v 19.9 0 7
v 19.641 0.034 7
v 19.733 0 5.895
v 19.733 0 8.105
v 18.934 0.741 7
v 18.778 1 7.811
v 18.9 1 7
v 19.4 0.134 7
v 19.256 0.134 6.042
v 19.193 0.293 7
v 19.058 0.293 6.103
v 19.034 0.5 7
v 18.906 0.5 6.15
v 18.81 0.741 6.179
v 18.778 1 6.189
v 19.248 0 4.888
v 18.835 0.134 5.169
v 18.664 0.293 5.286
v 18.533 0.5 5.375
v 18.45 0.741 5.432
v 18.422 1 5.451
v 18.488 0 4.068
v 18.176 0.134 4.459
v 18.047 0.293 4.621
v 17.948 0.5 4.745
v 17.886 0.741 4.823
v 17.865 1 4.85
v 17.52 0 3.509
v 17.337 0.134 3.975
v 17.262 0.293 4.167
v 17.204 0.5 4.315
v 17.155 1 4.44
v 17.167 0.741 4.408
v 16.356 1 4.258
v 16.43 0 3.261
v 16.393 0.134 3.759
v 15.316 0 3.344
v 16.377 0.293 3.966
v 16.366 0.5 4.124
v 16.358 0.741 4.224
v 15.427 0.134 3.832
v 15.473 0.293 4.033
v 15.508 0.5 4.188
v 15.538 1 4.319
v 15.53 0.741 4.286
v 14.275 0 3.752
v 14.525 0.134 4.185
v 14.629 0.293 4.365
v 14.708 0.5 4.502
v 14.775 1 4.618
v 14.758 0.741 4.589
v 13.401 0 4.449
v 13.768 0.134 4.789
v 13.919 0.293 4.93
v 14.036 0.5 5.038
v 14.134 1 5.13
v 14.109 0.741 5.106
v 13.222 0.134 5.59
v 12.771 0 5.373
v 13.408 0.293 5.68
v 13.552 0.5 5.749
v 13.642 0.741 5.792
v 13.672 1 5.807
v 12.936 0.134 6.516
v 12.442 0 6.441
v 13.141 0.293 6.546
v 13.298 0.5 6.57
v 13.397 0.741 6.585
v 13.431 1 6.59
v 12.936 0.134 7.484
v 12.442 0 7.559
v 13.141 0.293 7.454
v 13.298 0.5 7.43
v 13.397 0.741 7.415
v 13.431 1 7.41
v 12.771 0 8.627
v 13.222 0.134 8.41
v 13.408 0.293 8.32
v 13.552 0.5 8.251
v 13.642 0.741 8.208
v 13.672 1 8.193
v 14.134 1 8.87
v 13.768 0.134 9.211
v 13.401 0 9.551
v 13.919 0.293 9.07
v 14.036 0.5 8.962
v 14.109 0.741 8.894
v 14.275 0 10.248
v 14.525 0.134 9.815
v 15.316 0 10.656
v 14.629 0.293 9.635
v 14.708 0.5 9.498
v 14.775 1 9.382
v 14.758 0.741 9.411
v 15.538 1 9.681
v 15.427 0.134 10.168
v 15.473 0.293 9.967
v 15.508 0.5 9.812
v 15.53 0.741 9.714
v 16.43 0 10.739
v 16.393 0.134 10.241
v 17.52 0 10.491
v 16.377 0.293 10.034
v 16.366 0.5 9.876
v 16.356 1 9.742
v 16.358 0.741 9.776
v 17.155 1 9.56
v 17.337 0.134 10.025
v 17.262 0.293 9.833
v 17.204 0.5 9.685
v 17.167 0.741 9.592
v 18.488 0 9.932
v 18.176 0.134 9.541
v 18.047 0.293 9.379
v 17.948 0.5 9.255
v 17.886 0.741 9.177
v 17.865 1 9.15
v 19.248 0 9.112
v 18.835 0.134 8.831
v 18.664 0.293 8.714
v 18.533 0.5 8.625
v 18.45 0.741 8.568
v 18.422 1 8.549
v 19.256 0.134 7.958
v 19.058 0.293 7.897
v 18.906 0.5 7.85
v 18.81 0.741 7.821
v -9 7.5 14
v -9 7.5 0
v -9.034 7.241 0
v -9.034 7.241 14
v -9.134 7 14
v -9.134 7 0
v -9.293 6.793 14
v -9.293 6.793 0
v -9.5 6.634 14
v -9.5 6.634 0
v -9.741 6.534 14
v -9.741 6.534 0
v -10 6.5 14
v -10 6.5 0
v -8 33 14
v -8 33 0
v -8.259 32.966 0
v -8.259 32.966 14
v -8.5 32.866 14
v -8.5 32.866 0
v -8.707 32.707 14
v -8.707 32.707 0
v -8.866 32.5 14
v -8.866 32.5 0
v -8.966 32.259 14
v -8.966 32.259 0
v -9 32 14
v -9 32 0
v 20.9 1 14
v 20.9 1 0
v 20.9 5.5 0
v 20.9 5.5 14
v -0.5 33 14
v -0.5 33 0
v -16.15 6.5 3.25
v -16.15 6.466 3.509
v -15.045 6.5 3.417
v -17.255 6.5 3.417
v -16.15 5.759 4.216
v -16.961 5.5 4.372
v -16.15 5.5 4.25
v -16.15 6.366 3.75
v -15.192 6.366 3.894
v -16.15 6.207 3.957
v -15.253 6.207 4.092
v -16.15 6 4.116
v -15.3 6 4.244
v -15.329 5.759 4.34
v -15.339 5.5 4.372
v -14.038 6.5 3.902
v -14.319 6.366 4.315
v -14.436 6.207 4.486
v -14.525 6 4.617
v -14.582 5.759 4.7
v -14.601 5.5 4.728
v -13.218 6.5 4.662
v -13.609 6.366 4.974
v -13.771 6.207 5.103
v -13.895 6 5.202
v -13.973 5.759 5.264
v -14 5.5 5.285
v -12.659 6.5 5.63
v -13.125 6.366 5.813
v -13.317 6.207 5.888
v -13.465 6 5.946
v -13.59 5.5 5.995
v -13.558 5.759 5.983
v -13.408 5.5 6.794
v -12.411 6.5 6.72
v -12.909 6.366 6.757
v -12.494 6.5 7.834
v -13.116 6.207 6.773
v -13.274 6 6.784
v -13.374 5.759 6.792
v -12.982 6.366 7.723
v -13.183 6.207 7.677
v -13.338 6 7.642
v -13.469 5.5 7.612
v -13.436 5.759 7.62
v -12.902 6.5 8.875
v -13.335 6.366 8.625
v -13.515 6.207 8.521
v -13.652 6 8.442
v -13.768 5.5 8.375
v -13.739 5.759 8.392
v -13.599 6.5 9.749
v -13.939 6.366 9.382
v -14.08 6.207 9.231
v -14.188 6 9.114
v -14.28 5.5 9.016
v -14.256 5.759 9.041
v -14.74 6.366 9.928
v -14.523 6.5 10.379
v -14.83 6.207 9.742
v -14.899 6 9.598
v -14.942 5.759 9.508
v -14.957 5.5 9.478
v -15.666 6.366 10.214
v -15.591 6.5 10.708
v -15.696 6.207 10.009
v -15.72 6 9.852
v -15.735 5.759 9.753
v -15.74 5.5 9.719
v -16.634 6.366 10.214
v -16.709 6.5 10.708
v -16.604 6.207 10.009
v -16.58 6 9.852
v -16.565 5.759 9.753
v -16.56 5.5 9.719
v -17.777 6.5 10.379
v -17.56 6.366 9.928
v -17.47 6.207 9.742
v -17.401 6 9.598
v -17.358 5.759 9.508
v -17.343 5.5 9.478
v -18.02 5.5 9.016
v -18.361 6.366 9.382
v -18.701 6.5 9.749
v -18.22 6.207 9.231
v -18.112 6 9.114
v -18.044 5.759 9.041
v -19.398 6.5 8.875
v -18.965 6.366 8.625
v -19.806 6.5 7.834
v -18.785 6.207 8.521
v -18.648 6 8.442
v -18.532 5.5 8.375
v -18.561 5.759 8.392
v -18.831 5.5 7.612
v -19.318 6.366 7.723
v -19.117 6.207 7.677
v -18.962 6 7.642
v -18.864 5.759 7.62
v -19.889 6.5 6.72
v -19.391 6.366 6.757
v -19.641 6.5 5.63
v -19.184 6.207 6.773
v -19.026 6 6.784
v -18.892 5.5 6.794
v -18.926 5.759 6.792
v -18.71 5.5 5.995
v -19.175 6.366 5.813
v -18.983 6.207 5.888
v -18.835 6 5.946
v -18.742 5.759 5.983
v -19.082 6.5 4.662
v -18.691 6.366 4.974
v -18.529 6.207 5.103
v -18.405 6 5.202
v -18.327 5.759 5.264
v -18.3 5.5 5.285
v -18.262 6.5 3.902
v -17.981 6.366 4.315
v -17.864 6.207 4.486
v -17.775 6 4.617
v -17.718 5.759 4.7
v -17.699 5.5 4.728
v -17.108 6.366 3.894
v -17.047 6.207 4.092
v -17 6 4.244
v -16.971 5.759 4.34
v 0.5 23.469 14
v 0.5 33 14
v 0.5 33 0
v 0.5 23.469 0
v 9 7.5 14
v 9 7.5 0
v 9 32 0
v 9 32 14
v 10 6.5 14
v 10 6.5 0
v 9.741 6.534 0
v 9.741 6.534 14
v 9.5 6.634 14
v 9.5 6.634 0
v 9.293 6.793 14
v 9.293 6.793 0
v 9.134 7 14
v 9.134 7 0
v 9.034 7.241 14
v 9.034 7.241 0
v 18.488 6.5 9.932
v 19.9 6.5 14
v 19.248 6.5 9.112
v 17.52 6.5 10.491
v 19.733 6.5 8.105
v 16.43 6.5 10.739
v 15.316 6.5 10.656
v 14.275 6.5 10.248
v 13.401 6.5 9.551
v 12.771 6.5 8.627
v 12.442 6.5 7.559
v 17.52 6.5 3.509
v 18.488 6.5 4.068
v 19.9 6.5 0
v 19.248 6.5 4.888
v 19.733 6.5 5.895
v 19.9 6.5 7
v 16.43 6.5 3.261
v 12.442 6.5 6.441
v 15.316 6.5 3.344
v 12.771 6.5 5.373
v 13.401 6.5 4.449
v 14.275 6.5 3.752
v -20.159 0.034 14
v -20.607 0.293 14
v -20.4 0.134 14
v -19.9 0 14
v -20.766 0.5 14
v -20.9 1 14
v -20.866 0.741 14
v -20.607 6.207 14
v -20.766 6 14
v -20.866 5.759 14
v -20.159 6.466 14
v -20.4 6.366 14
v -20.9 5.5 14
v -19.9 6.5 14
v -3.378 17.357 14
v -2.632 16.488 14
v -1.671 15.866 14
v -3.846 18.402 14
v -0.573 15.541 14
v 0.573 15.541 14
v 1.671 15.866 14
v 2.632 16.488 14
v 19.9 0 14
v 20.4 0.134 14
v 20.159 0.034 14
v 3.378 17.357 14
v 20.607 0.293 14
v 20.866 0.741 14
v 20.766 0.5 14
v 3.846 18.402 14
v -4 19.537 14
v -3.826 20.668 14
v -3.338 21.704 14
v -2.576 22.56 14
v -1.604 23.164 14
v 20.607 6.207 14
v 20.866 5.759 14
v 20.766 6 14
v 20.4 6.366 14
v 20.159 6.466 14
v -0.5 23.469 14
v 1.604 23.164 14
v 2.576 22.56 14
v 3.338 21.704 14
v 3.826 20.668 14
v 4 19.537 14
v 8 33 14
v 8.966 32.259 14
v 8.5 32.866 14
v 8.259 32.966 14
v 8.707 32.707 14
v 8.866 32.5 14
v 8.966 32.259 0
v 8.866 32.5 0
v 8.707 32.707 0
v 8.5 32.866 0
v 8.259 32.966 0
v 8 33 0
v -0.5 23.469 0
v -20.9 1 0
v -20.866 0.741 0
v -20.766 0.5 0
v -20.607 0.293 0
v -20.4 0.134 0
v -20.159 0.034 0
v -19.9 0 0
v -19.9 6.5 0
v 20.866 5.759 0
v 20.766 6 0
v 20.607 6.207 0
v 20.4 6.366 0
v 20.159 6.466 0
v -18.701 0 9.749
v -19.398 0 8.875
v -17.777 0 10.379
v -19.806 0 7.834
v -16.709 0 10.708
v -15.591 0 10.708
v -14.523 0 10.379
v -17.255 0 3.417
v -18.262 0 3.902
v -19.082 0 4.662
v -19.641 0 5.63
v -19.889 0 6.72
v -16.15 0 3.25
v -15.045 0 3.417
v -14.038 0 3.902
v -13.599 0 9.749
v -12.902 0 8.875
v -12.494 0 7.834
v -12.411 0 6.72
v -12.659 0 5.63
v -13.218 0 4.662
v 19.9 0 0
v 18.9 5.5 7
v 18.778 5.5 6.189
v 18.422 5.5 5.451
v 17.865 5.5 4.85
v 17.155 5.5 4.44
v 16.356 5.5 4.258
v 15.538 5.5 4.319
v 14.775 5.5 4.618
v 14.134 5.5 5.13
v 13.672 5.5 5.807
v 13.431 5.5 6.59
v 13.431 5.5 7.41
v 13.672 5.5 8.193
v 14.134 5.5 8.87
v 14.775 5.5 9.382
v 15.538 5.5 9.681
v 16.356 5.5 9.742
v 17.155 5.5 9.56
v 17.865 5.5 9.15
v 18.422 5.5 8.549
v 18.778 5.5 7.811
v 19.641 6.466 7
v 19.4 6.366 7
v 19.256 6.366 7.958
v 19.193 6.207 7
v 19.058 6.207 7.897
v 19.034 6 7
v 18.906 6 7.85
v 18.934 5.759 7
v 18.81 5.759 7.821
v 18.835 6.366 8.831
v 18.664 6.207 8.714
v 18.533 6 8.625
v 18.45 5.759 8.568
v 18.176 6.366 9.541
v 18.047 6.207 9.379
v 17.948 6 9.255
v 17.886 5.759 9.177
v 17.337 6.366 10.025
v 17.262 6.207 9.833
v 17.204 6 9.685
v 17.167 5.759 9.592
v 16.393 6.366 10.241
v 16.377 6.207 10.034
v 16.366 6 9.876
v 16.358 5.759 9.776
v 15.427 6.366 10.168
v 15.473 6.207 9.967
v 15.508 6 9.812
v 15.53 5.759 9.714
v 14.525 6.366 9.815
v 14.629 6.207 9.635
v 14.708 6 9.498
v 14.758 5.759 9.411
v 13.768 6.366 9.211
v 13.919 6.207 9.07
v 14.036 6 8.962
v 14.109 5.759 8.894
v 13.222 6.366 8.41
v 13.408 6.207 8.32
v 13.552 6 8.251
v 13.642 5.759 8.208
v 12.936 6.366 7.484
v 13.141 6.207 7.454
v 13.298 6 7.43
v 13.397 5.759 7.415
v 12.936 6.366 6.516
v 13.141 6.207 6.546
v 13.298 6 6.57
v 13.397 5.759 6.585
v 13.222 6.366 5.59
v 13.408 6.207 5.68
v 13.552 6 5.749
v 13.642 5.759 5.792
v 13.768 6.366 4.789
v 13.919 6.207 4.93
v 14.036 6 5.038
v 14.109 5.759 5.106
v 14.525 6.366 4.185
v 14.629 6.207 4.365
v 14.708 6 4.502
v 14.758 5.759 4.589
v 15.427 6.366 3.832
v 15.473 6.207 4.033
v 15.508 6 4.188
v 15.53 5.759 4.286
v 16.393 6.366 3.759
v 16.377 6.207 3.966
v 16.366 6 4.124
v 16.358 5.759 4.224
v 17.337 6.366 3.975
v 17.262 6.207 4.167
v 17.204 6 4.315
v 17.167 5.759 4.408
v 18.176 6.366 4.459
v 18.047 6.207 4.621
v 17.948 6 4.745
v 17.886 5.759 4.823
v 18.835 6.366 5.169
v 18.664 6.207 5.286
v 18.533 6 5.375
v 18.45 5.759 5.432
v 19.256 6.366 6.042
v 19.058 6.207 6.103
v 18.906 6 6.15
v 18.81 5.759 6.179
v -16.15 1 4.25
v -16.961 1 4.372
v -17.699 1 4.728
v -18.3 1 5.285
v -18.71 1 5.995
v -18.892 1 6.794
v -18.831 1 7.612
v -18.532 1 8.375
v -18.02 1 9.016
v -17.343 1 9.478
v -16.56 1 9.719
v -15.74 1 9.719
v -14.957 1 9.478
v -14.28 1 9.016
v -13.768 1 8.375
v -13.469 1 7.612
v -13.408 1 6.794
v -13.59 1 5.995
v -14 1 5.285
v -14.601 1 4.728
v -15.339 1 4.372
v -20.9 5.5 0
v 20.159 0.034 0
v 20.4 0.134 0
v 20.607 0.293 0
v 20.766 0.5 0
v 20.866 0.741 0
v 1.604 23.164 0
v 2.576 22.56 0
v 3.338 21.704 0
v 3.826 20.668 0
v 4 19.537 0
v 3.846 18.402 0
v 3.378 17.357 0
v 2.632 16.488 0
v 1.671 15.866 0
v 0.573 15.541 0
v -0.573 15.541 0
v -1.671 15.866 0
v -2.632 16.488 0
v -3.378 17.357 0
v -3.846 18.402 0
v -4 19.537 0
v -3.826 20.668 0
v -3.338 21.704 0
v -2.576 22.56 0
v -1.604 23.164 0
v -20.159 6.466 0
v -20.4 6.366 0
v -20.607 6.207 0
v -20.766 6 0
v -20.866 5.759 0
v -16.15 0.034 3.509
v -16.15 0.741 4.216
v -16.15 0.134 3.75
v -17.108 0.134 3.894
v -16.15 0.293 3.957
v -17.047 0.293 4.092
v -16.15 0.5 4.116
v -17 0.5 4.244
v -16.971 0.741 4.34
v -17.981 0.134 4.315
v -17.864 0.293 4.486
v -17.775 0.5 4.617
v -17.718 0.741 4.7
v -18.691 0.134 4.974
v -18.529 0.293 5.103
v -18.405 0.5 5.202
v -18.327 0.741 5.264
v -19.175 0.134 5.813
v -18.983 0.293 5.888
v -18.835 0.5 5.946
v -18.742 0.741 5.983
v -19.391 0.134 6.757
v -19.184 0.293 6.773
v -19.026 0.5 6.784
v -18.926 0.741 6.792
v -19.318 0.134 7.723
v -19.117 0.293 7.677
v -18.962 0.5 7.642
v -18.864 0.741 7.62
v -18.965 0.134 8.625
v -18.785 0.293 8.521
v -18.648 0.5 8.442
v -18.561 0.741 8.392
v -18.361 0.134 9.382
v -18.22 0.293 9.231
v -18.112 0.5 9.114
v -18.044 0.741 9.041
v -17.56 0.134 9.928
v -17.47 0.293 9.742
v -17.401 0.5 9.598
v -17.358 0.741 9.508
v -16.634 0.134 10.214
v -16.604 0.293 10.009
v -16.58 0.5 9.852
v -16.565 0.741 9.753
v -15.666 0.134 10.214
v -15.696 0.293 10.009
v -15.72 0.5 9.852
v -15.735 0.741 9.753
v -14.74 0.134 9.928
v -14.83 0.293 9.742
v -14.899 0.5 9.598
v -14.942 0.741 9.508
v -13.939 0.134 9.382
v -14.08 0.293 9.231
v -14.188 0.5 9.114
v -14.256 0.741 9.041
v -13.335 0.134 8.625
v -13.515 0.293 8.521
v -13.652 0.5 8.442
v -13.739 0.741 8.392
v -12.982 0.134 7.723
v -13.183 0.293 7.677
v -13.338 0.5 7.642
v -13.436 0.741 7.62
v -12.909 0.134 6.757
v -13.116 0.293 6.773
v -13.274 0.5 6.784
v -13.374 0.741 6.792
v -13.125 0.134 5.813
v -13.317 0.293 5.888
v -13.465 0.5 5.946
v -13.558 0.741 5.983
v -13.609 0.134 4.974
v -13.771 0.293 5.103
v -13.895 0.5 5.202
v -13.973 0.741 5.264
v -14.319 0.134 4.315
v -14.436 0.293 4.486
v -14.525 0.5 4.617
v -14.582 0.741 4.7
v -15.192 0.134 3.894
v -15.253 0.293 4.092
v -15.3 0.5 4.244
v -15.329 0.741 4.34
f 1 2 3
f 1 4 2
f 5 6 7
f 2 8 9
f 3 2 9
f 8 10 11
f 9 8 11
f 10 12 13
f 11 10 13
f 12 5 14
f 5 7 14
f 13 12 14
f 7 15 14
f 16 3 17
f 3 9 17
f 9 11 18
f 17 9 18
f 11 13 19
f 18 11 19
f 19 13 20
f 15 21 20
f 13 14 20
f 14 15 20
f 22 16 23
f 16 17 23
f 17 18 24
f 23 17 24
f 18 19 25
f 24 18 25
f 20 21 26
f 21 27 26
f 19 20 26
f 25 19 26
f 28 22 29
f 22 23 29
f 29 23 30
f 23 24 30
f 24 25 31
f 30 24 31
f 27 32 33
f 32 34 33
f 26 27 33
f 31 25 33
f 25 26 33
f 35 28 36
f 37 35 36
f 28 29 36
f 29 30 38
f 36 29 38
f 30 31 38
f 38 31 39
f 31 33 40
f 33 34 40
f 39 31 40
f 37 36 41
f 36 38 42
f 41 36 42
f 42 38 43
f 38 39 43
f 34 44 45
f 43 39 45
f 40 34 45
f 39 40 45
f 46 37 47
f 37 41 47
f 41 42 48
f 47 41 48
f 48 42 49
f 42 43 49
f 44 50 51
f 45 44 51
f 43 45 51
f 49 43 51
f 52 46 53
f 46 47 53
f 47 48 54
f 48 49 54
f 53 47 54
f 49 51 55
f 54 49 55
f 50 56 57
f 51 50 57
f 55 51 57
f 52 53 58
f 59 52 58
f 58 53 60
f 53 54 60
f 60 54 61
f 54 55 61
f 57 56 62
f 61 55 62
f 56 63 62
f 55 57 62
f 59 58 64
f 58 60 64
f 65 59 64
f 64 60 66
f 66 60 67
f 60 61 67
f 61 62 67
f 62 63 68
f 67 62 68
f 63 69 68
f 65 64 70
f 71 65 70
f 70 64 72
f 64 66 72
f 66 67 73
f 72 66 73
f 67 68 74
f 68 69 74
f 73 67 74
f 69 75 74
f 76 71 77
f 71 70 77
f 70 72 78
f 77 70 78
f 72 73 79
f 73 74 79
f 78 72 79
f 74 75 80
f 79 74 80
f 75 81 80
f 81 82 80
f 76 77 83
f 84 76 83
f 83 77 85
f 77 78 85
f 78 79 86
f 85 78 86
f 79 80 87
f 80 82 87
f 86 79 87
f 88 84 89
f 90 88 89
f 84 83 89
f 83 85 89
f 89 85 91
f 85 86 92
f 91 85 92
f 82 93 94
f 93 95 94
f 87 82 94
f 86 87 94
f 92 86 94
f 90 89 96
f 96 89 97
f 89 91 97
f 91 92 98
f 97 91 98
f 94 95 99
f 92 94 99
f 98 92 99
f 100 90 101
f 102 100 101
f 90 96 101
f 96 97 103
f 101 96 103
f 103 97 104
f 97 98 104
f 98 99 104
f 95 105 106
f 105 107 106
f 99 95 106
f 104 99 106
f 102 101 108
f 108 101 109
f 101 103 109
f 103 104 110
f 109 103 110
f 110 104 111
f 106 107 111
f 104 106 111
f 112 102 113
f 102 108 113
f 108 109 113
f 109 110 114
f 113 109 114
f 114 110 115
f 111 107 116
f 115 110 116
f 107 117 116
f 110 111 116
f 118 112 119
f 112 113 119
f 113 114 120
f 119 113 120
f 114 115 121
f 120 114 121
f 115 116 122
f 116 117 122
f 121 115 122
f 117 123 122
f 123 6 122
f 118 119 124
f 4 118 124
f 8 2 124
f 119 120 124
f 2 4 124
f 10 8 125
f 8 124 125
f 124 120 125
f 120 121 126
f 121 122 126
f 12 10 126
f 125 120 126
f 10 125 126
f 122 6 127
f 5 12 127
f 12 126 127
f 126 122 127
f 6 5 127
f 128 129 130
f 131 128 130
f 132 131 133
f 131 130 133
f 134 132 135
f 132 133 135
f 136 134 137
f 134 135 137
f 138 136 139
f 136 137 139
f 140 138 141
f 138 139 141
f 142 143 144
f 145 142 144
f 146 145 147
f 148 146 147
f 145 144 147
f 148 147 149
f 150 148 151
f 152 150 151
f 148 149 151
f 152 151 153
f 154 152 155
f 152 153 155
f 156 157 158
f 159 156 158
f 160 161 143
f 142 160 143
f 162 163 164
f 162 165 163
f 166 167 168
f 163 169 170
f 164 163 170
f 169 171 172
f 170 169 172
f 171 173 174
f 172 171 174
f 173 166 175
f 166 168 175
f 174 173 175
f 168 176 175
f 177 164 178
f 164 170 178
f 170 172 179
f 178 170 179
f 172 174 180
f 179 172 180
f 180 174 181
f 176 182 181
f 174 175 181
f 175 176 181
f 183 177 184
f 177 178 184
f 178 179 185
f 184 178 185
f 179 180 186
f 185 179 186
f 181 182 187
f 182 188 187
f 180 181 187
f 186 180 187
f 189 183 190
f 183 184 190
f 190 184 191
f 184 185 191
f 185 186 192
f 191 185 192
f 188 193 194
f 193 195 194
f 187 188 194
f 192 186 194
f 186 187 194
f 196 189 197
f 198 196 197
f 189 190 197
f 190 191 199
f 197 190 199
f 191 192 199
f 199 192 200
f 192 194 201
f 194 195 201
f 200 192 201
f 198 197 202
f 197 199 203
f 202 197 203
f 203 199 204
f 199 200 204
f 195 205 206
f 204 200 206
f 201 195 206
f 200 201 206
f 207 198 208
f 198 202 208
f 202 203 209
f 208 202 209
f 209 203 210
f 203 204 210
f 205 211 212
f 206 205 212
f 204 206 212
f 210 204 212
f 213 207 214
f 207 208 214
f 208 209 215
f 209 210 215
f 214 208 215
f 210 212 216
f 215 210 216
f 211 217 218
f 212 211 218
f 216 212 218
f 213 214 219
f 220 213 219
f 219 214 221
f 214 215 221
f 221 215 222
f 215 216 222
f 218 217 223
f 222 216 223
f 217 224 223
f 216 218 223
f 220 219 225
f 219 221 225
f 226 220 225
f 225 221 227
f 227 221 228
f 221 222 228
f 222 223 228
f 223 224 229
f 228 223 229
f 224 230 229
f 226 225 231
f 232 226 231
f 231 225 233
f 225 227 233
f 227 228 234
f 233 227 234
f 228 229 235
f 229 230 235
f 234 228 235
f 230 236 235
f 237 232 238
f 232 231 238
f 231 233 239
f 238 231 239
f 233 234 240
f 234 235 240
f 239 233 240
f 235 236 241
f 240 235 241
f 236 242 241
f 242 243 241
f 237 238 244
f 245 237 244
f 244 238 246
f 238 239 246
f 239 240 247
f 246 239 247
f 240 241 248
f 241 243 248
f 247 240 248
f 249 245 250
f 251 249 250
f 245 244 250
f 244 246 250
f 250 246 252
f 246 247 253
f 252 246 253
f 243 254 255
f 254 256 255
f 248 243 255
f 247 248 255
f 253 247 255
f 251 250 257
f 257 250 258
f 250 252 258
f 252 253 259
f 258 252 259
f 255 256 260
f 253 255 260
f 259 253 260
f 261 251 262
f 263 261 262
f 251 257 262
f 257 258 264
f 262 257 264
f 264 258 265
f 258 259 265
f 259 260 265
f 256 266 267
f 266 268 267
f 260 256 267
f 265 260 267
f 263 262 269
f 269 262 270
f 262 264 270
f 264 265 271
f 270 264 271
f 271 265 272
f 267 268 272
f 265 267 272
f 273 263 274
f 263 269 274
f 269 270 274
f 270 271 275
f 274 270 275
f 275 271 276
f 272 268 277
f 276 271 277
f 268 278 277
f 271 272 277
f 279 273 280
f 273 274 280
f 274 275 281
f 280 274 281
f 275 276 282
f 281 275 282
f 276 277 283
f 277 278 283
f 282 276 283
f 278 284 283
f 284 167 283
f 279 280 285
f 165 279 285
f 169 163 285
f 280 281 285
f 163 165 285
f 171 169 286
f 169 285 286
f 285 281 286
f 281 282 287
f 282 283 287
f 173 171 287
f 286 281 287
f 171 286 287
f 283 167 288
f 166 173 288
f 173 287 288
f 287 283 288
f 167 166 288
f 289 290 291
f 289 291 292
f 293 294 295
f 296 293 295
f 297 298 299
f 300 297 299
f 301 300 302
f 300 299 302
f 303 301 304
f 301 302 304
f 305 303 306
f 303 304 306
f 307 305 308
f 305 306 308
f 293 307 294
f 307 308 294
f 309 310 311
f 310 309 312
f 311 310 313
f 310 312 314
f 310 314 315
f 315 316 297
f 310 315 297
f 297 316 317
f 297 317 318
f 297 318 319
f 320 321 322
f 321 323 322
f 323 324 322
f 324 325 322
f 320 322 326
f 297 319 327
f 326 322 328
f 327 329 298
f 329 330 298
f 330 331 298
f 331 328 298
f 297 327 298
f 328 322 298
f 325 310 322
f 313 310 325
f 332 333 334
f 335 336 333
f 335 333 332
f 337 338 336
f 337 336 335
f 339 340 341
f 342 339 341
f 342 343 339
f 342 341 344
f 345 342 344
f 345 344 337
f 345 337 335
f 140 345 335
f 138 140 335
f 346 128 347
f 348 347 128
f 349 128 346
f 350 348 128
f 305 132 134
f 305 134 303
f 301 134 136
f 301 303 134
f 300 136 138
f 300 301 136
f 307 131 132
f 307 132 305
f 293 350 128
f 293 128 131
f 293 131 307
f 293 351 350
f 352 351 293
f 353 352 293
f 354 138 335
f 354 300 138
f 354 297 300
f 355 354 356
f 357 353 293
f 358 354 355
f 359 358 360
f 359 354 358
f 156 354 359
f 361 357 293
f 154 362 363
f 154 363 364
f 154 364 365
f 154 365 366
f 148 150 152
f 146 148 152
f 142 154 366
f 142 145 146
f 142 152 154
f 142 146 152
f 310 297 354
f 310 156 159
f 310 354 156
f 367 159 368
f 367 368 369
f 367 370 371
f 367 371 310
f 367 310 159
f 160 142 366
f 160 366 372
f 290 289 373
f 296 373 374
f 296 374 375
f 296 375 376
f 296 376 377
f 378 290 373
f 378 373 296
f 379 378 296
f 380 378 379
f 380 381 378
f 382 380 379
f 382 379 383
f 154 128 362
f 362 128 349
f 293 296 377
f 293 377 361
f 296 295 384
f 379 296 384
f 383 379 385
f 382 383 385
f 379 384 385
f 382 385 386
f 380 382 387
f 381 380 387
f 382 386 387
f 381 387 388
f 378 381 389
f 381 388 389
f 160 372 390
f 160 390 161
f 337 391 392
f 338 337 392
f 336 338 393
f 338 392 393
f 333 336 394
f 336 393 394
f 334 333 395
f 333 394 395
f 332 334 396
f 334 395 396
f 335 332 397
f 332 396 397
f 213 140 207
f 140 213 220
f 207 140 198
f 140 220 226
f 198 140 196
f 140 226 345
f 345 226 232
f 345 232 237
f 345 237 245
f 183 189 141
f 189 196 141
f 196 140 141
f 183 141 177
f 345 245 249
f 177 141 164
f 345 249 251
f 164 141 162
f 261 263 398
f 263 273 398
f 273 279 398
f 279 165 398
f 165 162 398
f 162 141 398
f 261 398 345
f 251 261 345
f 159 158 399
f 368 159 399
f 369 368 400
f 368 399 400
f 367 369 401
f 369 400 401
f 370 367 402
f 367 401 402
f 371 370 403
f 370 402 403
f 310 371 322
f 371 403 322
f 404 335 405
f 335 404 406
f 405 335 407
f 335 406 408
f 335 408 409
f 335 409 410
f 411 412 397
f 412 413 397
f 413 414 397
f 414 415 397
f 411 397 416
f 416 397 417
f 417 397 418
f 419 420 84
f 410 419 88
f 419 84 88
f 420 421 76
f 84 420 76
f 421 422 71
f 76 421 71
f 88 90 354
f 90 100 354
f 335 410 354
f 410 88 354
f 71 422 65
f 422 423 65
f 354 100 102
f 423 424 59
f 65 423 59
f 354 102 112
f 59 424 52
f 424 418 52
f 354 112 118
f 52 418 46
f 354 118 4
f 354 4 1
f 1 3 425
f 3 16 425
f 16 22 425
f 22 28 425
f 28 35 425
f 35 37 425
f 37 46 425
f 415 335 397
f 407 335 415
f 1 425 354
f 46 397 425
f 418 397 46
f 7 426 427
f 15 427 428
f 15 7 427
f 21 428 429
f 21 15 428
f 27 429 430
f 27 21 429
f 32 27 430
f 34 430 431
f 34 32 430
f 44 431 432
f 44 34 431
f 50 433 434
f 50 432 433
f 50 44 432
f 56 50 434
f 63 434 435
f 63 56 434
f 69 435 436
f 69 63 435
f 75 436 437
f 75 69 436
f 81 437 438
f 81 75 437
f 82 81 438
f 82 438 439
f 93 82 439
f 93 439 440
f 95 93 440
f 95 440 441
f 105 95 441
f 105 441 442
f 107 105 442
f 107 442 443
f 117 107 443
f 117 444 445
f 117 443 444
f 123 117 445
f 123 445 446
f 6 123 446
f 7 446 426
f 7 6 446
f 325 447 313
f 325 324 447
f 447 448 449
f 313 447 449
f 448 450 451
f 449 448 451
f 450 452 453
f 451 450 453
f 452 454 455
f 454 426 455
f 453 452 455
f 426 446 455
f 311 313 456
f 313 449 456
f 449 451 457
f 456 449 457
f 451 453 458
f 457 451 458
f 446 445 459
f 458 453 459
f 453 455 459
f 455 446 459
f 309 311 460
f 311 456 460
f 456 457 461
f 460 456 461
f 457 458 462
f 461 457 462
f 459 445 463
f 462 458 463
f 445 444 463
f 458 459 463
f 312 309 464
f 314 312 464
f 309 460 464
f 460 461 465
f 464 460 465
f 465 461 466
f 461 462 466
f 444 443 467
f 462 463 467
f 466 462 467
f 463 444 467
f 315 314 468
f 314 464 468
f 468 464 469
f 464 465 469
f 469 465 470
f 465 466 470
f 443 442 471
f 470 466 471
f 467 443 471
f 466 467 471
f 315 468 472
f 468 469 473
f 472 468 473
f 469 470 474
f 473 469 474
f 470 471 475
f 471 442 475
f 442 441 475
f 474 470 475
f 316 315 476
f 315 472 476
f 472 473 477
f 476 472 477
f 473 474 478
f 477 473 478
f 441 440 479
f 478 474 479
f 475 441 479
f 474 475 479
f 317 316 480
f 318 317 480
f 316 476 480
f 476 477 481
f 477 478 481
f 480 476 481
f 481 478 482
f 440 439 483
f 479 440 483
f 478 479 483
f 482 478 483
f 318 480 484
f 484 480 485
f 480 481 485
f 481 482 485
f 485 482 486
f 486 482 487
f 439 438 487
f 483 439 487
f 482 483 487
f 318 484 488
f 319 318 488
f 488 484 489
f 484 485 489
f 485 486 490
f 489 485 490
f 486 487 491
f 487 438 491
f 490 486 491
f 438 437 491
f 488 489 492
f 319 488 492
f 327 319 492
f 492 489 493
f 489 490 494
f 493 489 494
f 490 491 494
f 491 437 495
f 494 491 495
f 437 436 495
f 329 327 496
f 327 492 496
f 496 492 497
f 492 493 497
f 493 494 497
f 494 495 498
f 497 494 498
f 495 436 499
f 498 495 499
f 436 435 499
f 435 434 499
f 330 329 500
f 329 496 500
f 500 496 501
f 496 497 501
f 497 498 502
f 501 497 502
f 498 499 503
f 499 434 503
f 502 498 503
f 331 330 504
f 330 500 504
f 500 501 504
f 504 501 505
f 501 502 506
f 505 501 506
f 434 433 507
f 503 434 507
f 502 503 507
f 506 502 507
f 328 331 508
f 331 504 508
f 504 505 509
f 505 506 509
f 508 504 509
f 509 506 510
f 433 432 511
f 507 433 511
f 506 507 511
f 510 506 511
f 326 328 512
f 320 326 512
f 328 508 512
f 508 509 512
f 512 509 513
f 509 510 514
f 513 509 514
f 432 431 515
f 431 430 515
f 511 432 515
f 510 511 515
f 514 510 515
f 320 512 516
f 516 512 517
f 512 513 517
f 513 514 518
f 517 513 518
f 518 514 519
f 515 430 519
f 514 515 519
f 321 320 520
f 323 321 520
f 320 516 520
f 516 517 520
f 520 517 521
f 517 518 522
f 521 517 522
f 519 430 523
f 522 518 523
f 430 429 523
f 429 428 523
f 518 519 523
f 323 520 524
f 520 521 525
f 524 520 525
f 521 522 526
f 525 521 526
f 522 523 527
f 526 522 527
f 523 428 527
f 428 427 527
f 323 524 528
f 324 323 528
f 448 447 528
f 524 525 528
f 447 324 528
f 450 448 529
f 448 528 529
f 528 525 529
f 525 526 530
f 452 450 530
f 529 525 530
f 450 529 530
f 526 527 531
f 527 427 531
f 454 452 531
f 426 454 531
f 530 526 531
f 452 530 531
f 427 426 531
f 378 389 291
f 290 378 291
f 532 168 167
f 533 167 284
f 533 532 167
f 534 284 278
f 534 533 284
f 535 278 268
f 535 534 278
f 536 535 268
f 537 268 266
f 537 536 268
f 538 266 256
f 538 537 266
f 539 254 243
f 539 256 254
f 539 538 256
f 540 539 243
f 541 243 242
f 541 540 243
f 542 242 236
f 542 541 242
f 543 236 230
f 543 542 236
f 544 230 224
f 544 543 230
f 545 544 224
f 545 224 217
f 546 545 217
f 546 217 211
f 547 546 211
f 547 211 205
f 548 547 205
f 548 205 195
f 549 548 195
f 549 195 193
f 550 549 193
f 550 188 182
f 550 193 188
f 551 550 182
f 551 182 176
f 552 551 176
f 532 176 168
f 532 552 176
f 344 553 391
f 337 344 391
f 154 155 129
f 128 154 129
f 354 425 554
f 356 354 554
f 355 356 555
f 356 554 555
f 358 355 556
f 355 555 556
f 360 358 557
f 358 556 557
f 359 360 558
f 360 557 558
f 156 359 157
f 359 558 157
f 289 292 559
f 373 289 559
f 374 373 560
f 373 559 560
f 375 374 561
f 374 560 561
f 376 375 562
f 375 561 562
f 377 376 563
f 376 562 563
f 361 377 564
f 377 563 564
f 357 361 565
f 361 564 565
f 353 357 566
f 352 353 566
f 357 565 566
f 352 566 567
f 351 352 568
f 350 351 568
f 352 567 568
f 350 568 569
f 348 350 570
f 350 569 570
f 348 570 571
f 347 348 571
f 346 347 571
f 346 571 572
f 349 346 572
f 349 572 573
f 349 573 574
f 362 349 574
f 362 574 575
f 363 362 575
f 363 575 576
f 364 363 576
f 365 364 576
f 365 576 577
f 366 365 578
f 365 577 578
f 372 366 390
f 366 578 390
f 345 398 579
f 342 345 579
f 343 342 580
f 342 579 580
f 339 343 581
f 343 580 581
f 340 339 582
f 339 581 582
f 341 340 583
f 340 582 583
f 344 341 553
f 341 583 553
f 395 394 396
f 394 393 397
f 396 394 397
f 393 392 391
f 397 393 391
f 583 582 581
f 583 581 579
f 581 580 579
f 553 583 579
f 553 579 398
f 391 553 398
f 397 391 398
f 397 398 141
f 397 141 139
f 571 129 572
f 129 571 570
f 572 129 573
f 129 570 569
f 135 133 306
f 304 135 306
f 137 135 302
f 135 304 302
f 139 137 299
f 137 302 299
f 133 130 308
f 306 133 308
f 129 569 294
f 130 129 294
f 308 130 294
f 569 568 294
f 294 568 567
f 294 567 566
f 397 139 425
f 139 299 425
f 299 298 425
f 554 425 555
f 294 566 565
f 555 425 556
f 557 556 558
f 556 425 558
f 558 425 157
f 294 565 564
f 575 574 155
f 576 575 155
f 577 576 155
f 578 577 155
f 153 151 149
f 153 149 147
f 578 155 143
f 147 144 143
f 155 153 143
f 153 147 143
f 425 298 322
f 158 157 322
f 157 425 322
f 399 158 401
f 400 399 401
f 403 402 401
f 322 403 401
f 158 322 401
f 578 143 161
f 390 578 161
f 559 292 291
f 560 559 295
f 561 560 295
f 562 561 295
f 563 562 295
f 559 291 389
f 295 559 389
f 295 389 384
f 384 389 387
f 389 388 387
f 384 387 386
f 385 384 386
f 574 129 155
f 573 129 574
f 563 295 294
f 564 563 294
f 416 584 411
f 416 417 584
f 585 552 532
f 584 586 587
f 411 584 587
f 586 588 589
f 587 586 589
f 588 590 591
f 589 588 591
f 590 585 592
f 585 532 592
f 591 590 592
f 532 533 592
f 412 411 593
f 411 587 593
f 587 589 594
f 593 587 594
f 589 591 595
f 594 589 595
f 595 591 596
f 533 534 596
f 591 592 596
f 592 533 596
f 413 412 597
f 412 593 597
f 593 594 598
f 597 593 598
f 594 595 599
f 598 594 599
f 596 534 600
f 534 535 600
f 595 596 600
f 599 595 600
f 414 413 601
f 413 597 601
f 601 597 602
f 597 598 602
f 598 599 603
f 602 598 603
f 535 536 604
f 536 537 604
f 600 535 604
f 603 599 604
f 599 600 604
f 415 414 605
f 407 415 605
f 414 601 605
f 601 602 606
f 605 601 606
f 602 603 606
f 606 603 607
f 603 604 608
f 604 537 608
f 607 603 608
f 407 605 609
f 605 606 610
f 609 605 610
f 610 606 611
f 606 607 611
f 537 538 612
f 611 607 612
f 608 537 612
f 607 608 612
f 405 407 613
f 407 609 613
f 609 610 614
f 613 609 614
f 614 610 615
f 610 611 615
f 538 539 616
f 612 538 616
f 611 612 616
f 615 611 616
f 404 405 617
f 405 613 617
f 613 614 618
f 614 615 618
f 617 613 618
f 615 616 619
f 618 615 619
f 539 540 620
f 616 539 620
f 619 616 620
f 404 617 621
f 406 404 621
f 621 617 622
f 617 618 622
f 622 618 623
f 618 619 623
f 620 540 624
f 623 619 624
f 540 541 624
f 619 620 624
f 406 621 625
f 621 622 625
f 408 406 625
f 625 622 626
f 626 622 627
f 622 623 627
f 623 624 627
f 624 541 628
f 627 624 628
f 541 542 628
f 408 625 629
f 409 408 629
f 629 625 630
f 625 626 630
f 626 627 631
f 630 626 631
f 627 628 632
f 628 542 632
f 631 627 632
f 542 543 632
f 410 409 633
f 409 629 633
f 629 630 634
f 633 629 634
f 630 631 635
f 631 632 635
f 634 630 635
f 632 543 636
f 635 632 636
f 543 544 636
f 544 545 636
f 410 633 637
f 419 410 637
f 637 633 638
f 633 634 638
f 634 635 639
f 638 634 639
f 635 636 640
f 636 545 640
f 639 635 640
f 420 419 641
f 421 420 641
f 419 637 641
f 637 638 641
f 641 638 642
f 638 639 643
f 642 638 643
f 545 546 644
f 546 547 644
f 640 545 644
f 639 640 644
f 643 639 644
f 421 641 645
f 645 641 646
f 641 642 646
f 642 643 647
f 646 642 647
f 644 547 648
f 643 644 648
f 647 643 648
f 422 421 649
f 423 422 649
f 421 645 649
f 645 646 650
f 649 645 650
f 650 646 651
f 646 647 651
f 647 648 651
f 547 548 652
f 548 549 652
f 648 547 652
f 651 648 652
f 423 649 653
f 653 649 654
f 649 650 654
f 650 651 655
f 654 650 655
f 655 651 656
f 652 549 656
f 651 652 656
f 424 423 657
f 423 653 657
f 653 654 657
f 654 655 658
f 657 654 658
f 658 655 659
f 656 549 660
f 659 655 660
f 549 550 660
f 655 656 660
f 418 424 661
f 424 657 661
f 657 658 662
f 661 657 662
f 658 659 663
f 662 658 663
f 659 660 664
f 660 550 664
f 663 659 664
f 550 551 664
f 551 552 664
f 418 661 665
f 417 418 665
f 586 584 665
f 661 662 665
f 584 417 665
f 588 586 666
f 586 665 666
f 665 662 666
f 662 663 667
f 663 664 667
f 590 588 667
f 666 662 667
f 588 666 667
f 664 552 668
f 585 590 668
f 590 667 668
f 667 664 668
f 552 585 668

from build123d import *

# Parameters (mm, degrees)
EXTRUDE_1_DEPTH     = 14
SKETCH_2_R          = 2.75
CUT_EXTRUDE_1_DEPTH = 14
FILLET_1_R          = 1


with BuildPart() as part:
    # 草图1 → 凸台-拉伸1 (new body)
    with BuildSketch(Plane.XY):
        with BuildLine():
            Line((-0.5, 33), (-8, 33))
            ThreePointArc((-8, 33), (-8.707106781, 32.707106781), (-9, 32))
            Line((-9, 32), (-9, 7.5))
            ThreePointArc((-9, 7.5), (-9.292893219, 6.792893219), (-10, 6.5))
            Line((-10, 6.5), (-19.9, 6.5))
            ThreePointArc((-19.9, 6.5), (-20.607106781, 6.207106781), (-20.9, 5.5))
            Line((-20.9, 5.5), (-20.9, 1))
            ThreePointArc((-20.9, 1), (-20.607106781, 0.292893219), (-19.9, 0))
            Line((-19.9, 0), (19.9, 0))
            ThreePointArc((19.9, 0), (20.607106781, 0.292893219), (20.9, 1))
            Line((20.9, 1), (20.9, 5.5))
            ThreePointArc((20.9, 5.5), (20.607106781, 6.207106781), (19.9, 6.5))
            Line((19.9, 6.5), (10, 6.5))
            ThreePointArc((10, 6.5), (9.292893219, 6.792893219), (9, 7.5))
            Line((9, 7.5), (9, 32))
            ThreePointArc((9, 32), (8.707106781, 32.707106781), (8, 33))
            Line((8, 33), (0.5, 33))
            Line((0.5, 33), (0.5, 23.468626967))
            ThreePointArc((0.5, 23.468626967), (0, 15.5), (-0.5, 23.468626967))
            Line((-0.5, 23.468626967), (-0.5, 33))
        make_face()
    extrude(amount=EXTRUDE_1_DEPTH)

    # 草图2 → 切除-拉伸1 (cut)
    with BuildSketch(Plane(origin=(0, 0, 0), x_dir=(1, 0, 0), z_dir=(0, 1, 0))):
        with Locations((16.15, -7)):
            Circle(SKETCH_2_R)
        with Locations(Location((-16.15, -7, 0), (0, 0, 90))):
            Circle(SKETCH_2_R)
    extrude(amount=CUT_EXTRUDE_1_DEPTH, mode=Mode.SUBTRACT)

    # 圆角1
    fillet_1_edges = [part.edges().sort_by_distance(p)[0] for p in [
        (13.4, 0, 7),
        (13.4, 6.5, 7),
        (-16.15, 0, 9.75),
        (-16.15, 6.5, 9.75),
    ]]
    fillet(fillet_1_edges, radius=FILLET_1_R - 0.0001)  # a hair under: the kernel refuses the full size


solid = part.part
